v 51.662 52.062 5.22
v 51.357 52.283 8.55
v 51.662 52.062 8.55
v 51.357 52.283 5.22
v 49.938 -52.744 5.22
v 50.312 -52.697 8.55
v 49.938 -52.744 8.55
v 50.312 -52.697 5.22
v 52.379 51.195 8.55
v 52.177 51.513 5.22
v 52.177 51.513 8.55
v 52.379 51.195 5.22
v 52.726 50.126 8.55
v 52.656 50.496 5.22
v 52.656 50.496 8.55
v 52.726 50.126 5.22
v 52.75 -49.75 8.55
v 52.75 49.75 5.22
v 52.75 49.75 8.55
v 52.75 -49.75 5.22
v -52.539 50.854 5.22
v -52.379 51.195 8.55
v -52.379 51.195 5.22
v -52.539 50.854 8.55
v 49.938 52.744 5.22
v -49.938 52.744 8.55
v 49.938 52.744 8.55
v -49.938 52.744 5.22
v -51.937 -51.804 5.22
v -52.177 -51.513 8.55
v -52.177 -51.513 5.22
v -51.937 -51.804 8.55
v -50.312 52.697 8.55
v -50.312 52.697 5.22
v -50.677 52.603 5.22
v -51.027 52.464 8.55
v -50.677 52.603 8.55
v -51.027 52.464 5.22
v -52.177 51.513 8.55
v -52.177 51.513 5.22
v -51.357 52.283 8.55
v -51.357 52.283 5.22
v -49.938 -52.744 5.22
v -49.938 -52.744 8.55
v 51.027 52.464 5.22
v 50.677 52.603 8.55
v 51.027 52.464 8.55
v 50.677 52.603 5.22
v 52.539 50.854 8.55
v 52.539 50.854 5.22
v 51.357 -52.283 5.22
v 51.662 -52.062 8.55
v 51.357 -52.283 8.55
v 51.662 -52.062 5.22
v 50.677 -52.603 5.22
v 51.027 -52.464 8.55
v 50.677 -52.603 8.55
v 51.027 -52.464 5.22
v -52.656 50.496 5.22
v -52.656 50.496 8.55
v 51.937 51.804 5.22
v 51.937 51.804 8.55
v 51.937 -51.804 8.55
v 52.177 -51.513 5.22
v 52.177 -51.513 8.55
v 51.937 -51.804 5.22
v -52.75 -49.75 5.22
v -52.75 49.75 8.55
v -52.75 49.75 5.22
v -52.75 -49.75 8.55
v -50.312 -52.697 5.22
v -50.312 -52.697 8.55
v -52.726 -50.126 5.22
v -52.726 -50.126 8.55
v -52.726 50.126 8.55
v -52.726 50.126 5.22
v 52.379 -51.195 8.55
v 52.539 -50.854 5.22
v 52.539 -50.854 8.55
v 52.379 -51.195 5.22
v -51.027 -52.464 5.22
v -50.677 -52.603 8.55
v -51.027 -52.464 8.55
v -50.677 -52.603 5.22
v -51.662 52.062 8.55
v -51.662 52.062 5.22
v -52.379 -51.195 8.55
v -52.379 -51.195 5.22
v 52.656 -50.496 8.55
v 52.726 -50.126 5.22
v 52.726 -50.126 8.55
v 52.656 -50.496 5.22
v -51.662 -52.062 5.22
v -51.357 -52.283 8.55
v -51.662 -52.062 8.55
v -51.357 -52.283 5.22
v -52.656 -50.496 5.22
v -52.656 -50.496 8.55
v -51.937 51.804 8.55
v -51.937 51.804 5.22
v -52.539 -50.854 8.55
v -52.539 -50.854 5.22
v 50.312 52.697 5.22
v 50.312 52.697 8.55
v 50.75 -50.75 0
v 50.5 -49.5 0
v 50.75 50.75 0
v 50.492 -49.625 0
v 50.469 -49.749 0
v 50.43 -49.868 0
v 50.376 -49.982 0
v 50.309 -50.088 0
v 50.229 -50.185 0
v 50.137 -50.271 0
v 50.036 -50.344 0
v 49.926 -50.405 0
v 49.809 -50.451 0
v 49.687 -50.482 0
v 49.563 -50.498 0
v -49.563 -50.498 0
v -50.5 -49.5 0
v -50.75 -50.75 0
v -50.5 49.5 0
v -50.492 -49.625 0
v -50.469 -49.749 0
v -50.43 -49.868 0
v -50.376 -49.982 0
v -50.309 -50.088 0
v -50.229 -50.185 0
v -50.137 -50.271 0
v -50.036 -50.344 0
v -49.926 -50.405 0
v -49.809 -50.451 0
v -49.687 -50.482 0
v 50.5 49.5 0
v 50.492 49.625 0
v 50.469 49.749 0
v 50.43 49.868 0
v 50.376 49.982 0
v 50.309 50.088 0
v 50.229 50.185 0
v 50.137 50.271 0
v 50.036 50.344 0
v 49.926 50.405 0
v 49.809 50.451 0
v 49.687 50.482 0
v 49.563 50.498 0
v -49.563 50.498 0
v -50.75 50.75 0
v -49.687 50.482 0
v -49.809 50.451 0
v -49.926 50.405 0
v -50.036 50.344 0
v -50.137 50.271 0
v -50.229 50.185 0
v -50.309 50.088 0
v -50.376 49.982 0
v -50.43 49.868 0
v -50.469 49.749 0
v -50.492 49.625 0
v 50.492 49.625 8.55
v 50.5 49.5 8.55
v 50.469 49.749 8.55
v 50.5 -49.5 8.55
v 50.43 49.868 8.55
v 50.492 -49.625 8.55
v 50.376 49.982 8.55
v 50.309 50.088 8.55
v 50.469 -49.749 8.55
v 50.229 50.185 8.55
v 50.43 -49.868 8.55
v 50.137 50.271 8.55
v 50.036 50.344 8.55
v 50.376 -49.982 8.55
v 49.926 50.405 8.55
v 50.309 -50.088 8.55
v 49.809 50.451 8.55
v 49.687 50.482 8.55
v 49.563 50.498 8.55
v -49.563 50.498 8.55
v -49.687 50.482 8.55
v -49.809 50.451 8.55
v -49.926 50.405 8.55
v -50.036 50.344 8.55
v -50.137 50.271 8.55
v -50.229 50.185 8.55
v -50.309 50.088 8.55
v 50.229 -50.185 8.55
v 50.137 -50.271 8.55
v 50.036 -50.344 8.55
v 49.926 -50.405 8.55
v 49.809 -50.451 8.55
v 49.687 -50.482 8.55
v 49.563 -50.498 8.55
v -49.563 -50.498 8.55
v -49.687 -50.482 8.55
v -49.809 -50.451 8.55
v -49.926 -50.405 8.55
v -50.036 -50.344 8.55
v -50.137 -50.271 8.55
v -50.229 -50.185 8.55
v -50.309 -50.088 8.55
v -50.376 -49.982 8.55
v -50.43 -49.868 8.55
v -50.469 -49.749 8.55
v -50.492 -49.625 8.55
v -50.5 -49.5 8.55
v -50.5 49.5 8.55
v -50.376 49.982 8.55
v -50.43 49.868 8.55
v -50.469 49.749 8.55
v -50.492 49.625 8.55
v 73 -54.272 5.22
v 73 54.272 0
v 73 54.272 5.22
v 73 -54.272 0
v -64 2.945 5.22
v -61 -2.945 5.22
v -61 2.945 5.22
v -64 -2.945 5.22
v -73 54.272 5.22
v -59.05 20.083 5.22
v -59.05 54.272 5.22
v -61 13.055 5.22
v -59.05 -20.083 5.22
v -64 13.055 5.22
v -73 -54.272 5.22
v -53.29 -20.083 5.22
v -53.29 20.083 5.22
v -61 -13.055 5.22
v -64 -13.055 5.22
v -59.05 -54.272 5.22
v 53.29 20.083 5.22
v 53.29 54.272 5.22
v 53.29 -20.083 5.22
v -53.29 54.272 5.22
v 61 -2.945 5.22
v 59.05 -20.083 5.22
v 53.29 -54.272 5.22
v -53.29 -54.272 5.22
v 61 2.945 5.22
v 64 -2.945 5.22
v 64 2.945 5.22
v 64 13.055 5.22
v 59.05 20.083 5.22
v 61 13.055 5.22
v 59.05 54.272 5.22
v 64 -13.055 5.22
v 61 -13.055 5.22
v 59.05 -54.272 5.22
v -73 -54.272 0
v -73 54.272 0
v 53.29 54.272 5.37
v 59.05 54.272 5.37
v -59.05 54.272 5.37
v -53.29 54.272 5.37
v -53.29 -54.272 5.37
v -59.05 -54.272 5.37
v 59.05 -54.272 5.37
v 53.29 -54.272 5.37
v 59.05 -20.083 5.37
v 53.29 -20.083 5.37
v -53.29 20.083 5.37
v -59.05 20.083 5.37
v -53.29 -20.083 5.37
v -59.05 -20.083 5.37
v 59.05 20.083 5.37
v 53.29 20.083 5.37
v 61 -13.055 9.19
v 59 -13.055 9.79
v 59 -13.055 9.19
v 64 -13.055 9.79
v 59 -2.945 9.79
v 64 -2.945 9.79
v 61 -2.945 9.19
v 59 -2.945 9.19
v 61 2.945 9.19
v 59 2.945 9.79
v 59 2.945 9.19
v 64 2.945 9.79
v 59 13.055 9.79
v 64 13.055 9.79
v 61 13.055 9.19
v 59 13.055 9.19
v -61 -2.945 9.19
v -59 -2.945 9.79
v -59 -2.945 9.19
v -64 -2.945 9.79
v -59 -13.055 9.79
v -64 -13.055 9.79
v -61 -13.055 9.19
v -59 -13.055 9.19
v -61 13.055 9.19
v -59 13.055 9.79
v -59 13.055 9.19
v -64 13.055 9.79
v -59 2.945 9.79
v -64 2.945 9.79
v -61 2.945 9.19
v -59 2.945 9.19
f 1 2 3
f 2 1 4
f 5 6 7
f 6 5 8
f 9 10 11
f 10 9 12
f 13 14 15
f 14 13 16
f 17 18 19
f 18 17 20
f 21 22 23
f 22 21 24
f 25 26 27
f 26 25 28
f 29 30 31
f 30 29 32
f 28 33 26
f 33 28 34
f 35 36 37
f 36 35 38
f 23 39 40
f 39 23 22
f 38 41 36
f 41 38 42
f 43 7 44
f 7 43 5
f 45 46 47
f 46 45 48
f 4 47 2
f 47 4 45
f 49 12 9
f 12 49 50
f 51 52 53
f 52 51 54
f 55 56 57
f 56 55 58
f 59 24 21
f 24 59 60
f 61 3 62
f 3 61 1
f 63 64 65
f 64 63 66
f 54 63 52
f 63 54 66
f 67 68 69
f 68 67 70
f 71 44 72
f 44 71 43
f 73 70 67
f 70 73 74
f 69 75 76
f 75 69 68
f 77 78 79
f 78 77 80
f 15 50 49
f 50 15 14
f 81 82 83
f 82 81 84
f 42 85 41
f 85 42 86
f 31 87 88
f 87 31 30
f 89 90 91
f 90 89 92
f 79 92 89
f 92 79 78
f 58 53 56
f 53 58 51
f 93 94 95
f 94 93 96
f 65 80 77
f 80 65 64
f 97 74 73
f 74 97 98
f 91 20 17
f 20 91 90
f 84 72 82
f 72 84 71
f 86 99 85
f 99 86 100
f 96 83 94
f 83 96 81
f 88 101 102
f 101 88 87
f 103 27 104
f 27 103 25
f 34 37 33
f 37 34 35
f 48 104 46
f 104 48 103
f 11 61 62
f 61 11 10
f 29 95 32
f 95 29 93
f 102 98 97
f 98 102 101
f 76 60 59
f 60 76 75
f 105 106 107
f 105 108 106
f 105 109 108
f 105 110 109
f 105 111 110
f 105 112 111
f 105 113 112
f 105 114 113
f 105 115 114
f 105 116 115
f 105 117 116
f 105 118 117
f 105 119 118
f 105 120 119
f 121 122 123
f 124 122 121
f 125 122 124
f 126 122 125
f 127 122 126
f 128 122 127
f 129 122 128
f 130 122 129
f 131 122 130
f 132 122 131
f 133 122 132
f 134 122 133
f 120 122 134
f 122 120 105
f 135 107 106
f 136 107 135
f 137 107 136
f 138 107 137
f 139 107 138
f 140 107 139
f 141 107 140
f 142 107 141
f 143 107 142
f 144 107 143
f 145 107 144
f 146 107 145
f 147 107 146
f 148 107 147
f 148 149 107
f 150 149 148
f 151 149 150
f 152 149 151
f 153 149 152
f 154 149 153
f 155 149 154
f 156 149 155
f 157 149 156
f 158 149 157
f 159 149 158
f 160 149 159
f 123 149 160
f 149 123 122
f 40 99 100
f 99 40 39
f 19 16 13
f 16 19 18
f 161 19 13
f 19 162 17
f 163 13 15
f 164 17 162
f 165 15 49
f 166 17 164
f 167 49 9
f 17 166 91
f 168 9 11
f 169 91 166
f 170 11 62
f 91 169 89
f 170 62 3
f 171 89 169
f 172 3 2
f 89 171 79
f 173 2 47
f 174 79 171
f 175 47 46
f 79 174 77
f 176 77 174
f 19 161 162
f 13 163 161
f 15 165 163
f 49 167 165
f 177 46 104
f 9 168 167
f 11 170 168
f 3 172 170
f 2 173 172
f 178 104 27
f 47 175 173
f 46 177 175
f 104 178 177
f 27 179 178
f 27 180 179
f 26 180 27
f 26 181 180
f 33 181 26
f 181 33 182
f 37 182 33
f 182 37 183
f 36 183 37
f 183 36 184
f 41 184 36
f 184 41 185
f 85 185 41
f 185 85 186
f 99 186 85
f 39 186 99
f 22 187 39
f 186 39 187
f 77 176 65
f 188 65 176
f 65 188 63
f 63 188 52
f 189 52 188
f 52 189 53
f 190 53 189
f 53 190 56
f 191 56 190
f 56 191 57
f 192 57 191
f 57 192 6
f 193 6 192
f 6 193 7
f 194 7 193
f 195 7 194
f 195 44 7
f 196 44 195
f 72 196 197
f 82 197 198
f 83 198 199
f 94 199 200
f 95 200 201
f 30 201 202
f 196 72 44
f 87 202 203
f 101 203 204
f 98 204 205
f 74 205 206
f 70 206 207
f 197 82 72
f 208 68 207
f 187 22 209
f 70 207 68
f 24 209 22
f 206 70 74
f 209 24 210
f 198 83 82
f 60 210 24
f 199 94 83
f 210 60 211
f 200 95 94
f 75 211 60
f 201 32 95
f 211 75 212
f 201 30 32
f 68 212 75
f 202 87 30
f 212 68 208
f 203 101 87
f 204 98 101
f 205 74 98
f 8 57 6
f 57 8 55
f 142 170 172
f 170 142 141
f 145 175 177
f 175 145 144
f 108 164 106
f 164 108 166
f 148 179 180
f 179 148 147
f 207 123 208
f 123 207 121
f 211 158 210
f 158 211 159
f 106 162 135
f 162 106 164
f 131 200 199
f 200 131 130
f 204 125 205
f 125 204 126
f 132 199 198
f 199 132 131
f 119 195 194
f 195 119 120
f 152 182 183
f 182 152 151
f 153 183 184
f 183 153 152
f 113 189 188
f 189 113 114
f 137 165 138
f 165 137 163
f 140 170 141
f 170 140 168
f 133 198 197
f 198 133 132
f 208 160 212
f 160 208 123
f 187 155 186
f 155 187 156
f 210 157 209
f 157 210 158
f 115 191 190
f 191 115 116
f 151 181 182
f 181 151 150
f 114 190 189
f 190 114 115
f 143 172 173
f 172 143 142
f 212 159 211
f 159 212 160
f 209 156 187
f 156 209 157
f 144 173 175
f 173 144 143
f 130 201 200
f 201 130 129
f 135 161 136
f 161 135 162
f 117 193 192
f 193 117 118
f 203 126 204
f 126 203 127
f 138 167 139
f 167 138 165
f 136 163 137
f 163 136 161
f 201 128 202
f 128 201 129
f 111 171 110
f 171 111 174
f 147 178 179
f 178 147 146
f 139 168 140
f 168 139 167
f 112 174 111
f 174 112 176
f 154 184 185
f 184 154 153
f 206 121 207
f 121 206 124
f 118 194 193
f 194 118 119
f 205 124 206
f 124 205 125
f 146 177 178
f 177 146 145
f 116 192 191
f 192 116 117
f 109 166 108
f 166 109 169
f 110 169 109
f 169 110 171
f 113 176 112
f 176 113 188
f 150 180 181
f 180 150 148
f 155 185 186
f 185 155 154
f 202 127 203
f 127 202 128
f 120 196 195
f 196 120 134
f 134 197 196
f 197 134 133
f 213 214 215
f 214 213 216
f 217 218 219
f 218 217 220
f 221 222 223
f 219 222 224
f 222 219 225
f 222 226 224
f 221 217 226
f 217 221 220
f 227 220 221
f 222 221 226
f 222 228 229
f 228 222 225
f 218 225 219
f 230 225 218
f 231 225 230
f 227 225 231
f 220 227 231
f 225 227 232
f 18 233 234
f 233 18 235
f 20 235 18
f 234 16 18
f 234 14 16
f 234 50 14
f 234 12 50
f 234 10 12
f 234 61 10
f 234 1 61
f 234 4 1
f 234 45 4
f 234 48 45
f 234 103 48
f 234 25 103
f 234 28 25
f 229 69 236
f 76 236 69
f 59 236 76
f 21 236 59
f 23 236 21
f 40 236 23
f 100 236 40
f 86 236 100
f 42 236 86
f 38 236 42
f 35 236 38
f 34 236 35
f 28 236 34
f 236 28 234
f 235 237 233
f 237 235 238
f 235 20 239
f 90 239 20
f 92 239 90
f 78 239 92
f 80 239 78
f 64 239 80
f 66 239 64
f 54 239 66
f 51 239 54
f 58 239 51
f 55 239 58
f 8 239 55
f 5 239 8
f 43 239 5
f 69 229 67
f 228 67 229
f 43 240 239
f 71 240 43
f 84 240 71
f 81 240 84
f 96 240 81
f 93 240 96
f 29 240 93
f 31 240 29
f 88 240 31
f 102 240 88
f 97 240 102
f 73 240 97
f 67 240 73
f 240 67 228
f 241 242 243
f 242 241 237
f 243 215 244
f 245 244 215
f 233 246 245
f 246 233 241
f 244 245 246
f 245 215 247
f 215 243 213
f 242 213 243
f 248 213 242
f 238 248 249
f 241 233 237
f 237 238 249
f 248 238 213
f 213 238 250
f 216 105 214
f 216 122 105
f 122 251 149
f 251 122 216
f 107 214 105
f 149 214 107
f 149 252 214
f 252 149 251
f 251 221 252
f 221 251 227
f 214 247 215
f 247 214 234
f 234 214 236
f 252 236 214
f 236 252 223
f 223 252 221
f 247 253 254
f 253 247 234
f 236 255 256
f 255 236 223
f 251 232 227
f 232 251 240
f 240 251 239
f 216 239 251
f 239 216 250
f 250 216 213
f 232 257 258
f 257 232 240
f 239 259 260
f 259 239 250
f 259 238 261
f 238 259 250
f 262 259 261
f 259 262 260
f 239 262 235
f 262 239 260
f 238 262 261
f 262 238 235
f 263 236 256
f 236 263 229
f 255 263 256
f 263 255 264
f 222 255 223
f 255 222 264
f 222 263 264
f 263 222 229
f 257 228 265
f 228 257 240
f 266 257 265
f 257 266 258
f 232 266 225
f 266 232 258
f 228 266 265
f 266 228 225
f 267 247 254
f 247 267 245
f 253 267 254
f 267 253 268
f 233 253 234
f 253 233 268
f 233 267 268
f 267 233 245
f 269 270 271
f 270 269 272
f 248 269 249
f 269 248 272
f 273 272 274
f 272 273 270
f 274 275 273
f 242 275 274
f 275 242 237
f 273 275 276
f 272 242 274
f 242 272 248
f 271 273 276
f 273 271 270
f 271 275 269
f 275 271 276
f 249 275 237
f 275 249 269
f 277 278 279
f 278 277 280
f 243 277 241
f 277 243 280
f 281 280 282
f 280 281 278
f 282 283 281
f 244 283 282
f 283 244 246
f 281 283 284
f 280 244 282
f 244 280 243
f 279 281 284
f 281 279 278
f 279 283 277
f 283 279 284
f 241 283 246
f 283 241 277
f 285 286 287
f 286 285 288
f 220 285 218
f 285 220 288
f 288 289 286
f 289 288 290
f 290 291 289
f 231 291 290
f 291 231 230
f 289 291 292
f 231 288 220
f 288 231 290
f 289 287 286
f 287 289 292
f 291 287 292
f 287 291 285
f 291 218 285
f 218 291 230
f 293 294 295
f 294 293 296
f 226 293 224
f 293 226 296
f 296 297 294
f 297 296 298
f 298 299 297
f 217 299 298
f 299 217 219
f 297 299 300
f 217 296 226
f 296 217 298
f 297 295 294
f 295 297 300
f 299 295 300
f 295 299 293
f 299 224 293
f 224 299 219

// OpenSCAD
// file: lib/misc.scad
/*

Polaroid 600 / Polaroid 600se Adapter

This work is licensed under a Creative Commons Attribution-NonCommercial-ShareAlike 3.0 Unported License.

https://creativecommons.org/licenses/by-nc-sa/3.0/

-----------------------

Various parts



*/

/* Nub dimensions [-------------------------------------------------------------- */

nub_depth = 34.19;
nub_width = 5.76;
nub_distance_from_seal = 2;
nub_distance_from_edge = 13.95;
nub_height_from_zero = 5.52;
nub_height = nub_height_from_zero - box_height;

/* Nub modules [-------------------------------------------------------------- */

module nub(nub_x, nub_y, nub_z) {
    
    translate([nub_x,nub_y,nub_z]){
                nub = [nub_width,nub_depth,nub_height];
                
                    cube(nub,  center=true);
                
            }
}


module nubs() {
    nub_position1 = (outer_box_width/2-nub_width/2 - nub_distance_from_edge);
    nub_position2 = outer_box_depth/2-nub_depth/2;
    
    nub(nub_position1, nub_position2*-1, box_height);
    nub(nub_position1*-1, nub_position2, box_height);
    nub(nub_position1*-1, nub_position2*-1, box_height);
    nub(nub_position1, nub_position2, box_height);
    
}
// file: lib/claws.scad
/*

Polaroid 600 / Polaroid 600se Adapter

This work is licensed under a Creative Commons Attribution-NonCommercial-ShareAlike 3.0 Unported License.

https://creativecommons.org/licenses/by-nc-sa/3.0/

-----------------------

Claws to hook into the camera body



*/


/* Claw dimensions [-------------------------------------------------------------- */

claw_width=10.11;
claw_depth = 5;
claw_height=5.92;
give = 2;


/* Claw modules [-------------------------------------------------------------- */

module claw(x,y,z, orientation) {
    
    translate([x,y,z]){
        rotate(a=[0,0, orientation]) {
            difference() {
                claw_coords = [claw_width,claw_depth,claw_height+z-give ];
                cube(claw_coords, center=true);
                translate([0,-1.5,-.6]){
                    
                    claw = [claw_width,claw_depth-3,claw_height+z-give];
                    cube(claw, center=true);
                    
                }
            }
        }
    }
}


module claws() {
 
    claw_x = outer_box_width/2-11.5;
    claw_y = 8 ; 

    claw(claw_x, -claw_y, box_height, -90);
    claw(claw_x, claw_y, box_height, -90);
    claw(-claw_x, -claw_y, box_height, 90);
    claw(-claw_x, claw_y, box_height, 90);
}
// file: lib/seal.scad
/*

Polaroid 600 / Polaroid 600se Adapter

This work is licensed under a Creative Commons Attribution-NonCommercial-ShareAlike 3.0 Unported License.

https://creativecommons.org/licenses/by-nc-sa/3.0/

-----------------------

Light seal

Seal to block the light

*/



/* Seal dimensions [-------------------------------------------------------------- */


seal_outer = 101;
seal_inner = 99.5;
seal_height = 7.55;
seal_wall_width = 2.11;

/* Seal Module [-------------------------------------------------------------- */


module seal() {
    // set it at 0
    translate([0,0,seal_height/2]){
    difference() {
        
        seal_box = [seal_outer,seal_outer,seal_height];
        //cube(seal_box, center=true);
        miniround(seal_box, 3, center=true);
        
       // inside of the seal
        inner_box = [seal_inner,seal_inner,seal_height];
        miniround(inner_box, 1, center=true);
        //cube(inner_box_lip, center=true);
        
    }
    }
}
// file: lib/base.scad
/*

Polaroid 600 / Polaroid 600se Adapter

This work is licensed under a Creative Commons Attribution-NonCommercial-ShareAlike 3.0 Unported License.

https://creativecommons.org/licenses/by-nc-sa/3.0/

-----------------------

Back Base



*/


/* Base dimensions [-------------------------------------------------------------- */

outer_box_width= 146;
outer_box_depth = 108.545;
box_height = 5.22;

/* Base module [-------------------------------------------------------------- */

module base() {
    // set it at 0
    translate([0,0,box_height/2]){
        difference() {
            // base
            outer_box = [outer_box_width,outer_box_depth,box_height];
            cube(outer_box, center=true);
 
            // cut out the inside
            inner_box = [seal_inner+2,seal_inner+2,box_height];
            cube(inner_box,  center=true);
         }
     }   
}
// file: lib/functions.scad
/*

Polaroid 600 / Polaroid 600se Adapter

This work is licensed under a Creative Commons Attribution-NonCommercial-ShareAlike 3.0 Unported License.

https://creativecommons.org/licenses/by-nc-sa/3.0/

-----------------------

Misc functions



*/


module miniround(size, radius, center=false)
{
	$fn=50;
	x = size[0]-radius/2;
	y = size[1]-radius/2;

	minkowski()
	{
    	cube(size=[x,y,size[2]], center=center);
    	cylinder(r=radius);
    	// Using a sphere is possible, but will kill performance
    	//sphere(r=radius);
	}
}
// main file
/*

Polaroid 600 / Polaroid 600se Adapter

Refactor of first try


This work is licensed under a Creative Commons Attribution-NonCommercial-ShareAlike 3.0 Unported License.

https://creativecommons.org/licenses/by-nc-sa/3.0/

Todo:
1) Test test test


*/

include <lib/functions.scad>
  
include <lib/base.scad> // Back base
include <lib/seal.scad> // Light seal
include <lib/claws.scad>  // Claws
include <lib/misc.scad> // misc parts


module adapter() {

    union() {
        color( "green", 1.0 ){
            seal();
        }
        color( "blue", 1.0 ){
            base();
        }
        color( "red", 1.0 ){
            nubs();
        }
        
        color( "yellow", 1.0 ){
            claws();
        }
        
    }
}




adapter(); // Let's get that adapter going!
